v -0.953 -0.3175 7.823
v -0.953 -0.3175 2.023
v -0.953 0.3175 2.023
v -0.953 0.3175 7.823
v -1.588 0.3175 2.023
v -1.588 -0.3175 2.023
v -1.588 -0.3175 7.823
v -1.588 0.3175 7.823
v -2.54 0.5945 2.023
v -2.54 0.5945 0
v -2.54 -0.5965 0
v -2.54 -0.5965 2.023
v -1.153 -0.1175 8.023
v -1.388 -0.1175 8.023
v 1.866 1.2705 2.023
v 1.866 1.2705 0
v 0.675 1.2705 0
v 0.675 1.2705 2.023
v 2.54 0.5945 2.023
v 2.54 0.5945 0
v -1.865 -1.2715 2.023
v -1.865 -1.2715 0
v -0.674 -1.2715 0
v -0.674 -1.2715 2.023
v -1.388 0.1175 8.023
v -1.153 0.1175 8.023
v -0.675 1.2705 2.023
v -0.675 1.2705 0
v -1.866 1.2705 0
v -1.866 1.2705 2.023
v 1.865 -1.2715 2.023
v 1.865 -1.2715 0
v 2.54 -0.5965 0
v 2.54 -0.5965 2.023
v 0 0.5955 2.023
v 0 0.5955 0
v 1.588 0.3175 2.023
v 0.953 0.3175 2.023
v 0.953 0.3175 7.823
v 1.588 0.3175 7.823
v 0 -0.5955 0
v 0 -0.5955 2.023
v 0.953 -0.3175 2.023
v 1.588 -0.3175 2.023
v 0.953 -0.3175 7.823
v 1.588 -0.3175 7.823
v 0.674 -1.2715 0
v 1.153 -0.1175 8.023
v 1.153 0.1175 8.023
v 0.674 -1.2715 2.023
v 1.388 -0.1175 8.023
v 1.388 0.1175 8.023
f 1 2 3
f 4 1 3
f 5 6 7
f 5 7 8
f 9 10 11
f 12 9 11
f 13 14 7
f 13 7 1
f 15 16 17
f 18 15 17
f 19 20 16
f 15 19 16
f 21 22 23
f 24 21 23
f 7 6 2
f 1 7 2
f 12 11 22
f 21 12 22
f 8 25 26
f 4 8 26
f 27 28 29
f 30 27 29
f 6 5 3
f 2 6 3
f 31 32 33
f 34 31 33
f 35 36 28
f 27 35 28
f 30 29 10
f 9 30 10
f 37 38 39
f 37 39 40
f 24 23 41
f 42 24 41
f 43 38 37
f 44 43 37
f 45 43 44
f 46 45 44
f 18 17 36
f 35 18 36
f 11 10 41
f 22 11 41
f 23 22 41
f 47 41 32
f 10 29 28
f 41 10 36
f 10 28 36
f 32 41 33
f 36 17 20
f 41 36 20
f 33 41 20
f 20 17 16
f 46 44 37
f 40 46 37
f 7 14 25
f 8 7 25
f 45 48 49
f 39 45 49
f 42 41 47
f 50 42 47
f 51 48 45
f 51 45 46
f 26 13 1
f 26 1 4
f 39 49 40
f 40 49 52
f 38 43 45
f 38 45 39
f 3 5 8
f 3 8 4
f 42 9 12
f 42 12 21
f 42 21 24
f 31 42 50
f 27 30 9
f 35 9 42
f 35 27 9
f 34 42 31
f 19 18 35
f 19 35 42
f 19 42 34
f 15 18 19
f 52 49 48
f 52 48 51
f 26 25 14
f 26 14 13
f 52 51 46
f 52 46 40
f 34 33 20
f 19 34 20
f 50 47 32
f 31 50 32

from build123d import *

# Parameters (mm, degrees)
F1_DEPTH = 2.023
F2_W     = 0.635
F2_H     = 0.635
F3_DEPTH = 6
F4_SIZE  = 0.2


with BuildPart() as f1:
    # F0 (on Top) → F1 (new body)
    with BuildSketch(Plane.XY):
        Polygon((-0.675, 1.2705), (-1.866, 1.2705), (-2.54, 0.594501), (-2.54, -0.596499), (-1.865, -1.271499), (-0.674, -1.271499), (0, -0.5955), (0, 0.5955), align=None)
        Polygon((0.675, 1.2705), (0, 0.5955), (0, -0.5955), (0.674, -1.271499), (1.865, -1.271499), (2.54, -0.596499), (2.54, 0.594501), (1.866, 1.2705), align=None)
    extrude(amount=F1_DEPTH)


with BuildPart() as f3:
    # F2 (on face) → F3 (new body)
    with BuildSketch(Plane.XY.offset(2.023)):
        with Locations((-1.2705, 0)):
            Rectangle(F2_W, F2_H)
        with Locations((1.2705, 0)):
            Rectangle(F2_W, F2_H)
    extrude(amount=F3_DEPTH)

    # F4
    f4_edges = [f3.edges().sort_by_distance(p)[0] for p in [
        (-1.2705, 0.3175, 8.023),
        (-1.588, 0, 8.023),
        (-1.2705, -0.3175, 8.023),
        (-0.953, 0, 8.023),
        (1.2705, 0.3175, 8.023),
        (0.953, 0, 8.023),
        (1.2705, -0.3175, 8.023),
        (1.588, 0, 8.023),
    ]]
    chamfer(f4_edges, length=F4_SIZE)


solid = Compound([f1.part, f3.part])
